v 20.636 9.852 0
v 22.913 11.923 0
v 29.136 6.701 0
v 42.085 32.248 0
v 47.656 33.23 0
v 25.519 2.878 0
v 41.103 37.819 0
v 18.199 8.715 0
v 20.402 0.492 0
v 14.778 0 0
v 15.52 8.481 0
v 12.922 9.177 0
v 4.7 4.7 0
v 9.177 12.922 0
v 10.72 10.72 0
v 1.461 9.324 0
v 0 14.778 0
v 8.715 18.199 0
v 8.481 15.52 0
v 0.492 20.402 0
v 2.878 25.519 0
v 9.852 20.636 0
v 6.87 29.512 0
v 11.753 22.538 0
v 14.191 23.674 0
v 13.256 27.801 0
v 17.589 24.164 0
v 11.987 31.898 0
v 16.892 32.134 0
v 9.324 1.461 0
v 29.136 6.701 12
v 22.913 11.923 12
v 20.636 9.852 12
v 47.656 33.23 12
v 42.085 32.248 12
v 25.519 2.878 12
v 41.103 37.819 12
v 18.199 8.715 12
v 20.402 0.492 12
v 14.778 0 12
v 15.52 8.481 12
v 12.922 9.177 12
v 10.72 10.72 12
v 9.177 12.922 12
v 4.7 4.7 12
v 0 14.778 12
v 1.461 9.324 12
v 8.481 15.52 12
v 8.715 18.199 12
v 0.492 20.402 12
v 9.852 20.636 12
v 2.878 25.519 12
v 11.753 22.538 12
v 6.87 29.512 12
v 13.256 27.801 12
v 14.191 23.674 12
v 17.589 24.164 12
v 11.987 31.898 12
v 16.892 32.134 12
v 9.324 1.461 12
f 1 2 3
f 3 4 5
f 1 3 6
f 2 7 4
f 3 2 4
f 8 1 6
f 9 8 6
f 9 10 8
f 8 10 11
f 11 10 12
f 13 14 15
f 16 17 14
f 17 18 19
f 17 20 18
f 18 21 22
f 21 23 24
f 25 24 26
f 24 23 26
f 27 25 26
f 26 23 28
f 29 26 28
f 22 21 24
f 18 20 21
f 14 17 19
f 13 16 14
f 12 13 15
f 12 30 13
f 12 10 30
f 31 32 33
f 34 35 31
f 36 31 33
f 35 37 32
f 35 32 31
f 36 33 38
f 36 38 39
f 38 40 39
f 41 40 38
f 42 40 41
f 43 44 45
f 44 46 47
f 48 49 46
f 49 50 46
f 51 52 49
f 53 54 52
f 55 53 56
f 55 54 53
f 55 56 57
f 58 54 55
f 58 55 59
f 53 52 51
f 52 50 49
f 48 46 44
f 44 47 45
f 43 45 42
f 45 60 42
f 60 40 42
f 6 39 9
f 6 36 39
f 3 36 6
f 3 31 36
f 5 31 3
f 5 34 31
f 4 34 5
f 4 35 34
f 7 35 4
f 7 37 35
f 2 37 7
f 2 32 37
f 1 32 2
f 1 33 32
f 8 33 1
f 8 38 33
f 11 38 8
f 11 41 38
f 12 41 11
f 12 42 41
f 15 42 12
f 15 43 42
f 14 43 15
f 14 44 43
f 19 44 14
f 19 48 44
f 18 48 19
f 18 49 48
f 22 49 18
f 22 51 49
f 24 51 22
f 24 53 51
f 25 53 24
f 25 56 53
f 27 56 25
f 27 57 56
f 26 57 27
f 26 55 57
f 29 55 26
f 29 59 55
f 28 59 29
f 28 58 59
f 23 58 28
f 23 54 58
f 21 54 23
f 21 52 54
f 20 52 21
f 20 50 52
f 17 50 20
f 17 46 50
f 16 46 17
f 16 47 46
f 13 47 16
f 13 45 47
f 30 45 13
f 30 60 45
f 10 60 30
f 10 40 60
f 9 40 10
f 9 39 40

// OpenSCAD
$fn = 32;

// ----------------------------------------------------------------------
// Eye lug: ring_tail, 12 mm thick
// ----------------------------------------------------------------------

// --- parameters (mm) ---
profile_height = 12;      // extrusion height
profile_points = 30;      // points of the closed outline

profile = [[13.256, 27.801], [16.892, 32.134], [11.987, 31.898], [6.87, 29.512], [2.878, 25.519], [0.492, 20.402], [0, 14.778], [1.461, 9.324], [4.7, 4.7], [9.324, 1.461], [14.778, 0], [20.402, 0.492], [25.519, 2.878], [29.136, 6.701], [47.656, 33.23], [42.085, 32.248], [41.103, 37.819], [22.913, 11.923], [20.636, 9.852], [18.199, 8.715], [15.52, 8.481], [12.922, 9.177], [10.72, 10.72], [9.177, 12.922], [8.481, 15.52], [8.715, 18.199], [9.852, 20.636], [11.753, 22.538], [14.191, 23.674], [17.589, 24.164]];  // single closed polygon, 30 points, counter clockwise

// --- the one profile operation ---
linear_extrude(height = profile_height) polygon(points = profile);
